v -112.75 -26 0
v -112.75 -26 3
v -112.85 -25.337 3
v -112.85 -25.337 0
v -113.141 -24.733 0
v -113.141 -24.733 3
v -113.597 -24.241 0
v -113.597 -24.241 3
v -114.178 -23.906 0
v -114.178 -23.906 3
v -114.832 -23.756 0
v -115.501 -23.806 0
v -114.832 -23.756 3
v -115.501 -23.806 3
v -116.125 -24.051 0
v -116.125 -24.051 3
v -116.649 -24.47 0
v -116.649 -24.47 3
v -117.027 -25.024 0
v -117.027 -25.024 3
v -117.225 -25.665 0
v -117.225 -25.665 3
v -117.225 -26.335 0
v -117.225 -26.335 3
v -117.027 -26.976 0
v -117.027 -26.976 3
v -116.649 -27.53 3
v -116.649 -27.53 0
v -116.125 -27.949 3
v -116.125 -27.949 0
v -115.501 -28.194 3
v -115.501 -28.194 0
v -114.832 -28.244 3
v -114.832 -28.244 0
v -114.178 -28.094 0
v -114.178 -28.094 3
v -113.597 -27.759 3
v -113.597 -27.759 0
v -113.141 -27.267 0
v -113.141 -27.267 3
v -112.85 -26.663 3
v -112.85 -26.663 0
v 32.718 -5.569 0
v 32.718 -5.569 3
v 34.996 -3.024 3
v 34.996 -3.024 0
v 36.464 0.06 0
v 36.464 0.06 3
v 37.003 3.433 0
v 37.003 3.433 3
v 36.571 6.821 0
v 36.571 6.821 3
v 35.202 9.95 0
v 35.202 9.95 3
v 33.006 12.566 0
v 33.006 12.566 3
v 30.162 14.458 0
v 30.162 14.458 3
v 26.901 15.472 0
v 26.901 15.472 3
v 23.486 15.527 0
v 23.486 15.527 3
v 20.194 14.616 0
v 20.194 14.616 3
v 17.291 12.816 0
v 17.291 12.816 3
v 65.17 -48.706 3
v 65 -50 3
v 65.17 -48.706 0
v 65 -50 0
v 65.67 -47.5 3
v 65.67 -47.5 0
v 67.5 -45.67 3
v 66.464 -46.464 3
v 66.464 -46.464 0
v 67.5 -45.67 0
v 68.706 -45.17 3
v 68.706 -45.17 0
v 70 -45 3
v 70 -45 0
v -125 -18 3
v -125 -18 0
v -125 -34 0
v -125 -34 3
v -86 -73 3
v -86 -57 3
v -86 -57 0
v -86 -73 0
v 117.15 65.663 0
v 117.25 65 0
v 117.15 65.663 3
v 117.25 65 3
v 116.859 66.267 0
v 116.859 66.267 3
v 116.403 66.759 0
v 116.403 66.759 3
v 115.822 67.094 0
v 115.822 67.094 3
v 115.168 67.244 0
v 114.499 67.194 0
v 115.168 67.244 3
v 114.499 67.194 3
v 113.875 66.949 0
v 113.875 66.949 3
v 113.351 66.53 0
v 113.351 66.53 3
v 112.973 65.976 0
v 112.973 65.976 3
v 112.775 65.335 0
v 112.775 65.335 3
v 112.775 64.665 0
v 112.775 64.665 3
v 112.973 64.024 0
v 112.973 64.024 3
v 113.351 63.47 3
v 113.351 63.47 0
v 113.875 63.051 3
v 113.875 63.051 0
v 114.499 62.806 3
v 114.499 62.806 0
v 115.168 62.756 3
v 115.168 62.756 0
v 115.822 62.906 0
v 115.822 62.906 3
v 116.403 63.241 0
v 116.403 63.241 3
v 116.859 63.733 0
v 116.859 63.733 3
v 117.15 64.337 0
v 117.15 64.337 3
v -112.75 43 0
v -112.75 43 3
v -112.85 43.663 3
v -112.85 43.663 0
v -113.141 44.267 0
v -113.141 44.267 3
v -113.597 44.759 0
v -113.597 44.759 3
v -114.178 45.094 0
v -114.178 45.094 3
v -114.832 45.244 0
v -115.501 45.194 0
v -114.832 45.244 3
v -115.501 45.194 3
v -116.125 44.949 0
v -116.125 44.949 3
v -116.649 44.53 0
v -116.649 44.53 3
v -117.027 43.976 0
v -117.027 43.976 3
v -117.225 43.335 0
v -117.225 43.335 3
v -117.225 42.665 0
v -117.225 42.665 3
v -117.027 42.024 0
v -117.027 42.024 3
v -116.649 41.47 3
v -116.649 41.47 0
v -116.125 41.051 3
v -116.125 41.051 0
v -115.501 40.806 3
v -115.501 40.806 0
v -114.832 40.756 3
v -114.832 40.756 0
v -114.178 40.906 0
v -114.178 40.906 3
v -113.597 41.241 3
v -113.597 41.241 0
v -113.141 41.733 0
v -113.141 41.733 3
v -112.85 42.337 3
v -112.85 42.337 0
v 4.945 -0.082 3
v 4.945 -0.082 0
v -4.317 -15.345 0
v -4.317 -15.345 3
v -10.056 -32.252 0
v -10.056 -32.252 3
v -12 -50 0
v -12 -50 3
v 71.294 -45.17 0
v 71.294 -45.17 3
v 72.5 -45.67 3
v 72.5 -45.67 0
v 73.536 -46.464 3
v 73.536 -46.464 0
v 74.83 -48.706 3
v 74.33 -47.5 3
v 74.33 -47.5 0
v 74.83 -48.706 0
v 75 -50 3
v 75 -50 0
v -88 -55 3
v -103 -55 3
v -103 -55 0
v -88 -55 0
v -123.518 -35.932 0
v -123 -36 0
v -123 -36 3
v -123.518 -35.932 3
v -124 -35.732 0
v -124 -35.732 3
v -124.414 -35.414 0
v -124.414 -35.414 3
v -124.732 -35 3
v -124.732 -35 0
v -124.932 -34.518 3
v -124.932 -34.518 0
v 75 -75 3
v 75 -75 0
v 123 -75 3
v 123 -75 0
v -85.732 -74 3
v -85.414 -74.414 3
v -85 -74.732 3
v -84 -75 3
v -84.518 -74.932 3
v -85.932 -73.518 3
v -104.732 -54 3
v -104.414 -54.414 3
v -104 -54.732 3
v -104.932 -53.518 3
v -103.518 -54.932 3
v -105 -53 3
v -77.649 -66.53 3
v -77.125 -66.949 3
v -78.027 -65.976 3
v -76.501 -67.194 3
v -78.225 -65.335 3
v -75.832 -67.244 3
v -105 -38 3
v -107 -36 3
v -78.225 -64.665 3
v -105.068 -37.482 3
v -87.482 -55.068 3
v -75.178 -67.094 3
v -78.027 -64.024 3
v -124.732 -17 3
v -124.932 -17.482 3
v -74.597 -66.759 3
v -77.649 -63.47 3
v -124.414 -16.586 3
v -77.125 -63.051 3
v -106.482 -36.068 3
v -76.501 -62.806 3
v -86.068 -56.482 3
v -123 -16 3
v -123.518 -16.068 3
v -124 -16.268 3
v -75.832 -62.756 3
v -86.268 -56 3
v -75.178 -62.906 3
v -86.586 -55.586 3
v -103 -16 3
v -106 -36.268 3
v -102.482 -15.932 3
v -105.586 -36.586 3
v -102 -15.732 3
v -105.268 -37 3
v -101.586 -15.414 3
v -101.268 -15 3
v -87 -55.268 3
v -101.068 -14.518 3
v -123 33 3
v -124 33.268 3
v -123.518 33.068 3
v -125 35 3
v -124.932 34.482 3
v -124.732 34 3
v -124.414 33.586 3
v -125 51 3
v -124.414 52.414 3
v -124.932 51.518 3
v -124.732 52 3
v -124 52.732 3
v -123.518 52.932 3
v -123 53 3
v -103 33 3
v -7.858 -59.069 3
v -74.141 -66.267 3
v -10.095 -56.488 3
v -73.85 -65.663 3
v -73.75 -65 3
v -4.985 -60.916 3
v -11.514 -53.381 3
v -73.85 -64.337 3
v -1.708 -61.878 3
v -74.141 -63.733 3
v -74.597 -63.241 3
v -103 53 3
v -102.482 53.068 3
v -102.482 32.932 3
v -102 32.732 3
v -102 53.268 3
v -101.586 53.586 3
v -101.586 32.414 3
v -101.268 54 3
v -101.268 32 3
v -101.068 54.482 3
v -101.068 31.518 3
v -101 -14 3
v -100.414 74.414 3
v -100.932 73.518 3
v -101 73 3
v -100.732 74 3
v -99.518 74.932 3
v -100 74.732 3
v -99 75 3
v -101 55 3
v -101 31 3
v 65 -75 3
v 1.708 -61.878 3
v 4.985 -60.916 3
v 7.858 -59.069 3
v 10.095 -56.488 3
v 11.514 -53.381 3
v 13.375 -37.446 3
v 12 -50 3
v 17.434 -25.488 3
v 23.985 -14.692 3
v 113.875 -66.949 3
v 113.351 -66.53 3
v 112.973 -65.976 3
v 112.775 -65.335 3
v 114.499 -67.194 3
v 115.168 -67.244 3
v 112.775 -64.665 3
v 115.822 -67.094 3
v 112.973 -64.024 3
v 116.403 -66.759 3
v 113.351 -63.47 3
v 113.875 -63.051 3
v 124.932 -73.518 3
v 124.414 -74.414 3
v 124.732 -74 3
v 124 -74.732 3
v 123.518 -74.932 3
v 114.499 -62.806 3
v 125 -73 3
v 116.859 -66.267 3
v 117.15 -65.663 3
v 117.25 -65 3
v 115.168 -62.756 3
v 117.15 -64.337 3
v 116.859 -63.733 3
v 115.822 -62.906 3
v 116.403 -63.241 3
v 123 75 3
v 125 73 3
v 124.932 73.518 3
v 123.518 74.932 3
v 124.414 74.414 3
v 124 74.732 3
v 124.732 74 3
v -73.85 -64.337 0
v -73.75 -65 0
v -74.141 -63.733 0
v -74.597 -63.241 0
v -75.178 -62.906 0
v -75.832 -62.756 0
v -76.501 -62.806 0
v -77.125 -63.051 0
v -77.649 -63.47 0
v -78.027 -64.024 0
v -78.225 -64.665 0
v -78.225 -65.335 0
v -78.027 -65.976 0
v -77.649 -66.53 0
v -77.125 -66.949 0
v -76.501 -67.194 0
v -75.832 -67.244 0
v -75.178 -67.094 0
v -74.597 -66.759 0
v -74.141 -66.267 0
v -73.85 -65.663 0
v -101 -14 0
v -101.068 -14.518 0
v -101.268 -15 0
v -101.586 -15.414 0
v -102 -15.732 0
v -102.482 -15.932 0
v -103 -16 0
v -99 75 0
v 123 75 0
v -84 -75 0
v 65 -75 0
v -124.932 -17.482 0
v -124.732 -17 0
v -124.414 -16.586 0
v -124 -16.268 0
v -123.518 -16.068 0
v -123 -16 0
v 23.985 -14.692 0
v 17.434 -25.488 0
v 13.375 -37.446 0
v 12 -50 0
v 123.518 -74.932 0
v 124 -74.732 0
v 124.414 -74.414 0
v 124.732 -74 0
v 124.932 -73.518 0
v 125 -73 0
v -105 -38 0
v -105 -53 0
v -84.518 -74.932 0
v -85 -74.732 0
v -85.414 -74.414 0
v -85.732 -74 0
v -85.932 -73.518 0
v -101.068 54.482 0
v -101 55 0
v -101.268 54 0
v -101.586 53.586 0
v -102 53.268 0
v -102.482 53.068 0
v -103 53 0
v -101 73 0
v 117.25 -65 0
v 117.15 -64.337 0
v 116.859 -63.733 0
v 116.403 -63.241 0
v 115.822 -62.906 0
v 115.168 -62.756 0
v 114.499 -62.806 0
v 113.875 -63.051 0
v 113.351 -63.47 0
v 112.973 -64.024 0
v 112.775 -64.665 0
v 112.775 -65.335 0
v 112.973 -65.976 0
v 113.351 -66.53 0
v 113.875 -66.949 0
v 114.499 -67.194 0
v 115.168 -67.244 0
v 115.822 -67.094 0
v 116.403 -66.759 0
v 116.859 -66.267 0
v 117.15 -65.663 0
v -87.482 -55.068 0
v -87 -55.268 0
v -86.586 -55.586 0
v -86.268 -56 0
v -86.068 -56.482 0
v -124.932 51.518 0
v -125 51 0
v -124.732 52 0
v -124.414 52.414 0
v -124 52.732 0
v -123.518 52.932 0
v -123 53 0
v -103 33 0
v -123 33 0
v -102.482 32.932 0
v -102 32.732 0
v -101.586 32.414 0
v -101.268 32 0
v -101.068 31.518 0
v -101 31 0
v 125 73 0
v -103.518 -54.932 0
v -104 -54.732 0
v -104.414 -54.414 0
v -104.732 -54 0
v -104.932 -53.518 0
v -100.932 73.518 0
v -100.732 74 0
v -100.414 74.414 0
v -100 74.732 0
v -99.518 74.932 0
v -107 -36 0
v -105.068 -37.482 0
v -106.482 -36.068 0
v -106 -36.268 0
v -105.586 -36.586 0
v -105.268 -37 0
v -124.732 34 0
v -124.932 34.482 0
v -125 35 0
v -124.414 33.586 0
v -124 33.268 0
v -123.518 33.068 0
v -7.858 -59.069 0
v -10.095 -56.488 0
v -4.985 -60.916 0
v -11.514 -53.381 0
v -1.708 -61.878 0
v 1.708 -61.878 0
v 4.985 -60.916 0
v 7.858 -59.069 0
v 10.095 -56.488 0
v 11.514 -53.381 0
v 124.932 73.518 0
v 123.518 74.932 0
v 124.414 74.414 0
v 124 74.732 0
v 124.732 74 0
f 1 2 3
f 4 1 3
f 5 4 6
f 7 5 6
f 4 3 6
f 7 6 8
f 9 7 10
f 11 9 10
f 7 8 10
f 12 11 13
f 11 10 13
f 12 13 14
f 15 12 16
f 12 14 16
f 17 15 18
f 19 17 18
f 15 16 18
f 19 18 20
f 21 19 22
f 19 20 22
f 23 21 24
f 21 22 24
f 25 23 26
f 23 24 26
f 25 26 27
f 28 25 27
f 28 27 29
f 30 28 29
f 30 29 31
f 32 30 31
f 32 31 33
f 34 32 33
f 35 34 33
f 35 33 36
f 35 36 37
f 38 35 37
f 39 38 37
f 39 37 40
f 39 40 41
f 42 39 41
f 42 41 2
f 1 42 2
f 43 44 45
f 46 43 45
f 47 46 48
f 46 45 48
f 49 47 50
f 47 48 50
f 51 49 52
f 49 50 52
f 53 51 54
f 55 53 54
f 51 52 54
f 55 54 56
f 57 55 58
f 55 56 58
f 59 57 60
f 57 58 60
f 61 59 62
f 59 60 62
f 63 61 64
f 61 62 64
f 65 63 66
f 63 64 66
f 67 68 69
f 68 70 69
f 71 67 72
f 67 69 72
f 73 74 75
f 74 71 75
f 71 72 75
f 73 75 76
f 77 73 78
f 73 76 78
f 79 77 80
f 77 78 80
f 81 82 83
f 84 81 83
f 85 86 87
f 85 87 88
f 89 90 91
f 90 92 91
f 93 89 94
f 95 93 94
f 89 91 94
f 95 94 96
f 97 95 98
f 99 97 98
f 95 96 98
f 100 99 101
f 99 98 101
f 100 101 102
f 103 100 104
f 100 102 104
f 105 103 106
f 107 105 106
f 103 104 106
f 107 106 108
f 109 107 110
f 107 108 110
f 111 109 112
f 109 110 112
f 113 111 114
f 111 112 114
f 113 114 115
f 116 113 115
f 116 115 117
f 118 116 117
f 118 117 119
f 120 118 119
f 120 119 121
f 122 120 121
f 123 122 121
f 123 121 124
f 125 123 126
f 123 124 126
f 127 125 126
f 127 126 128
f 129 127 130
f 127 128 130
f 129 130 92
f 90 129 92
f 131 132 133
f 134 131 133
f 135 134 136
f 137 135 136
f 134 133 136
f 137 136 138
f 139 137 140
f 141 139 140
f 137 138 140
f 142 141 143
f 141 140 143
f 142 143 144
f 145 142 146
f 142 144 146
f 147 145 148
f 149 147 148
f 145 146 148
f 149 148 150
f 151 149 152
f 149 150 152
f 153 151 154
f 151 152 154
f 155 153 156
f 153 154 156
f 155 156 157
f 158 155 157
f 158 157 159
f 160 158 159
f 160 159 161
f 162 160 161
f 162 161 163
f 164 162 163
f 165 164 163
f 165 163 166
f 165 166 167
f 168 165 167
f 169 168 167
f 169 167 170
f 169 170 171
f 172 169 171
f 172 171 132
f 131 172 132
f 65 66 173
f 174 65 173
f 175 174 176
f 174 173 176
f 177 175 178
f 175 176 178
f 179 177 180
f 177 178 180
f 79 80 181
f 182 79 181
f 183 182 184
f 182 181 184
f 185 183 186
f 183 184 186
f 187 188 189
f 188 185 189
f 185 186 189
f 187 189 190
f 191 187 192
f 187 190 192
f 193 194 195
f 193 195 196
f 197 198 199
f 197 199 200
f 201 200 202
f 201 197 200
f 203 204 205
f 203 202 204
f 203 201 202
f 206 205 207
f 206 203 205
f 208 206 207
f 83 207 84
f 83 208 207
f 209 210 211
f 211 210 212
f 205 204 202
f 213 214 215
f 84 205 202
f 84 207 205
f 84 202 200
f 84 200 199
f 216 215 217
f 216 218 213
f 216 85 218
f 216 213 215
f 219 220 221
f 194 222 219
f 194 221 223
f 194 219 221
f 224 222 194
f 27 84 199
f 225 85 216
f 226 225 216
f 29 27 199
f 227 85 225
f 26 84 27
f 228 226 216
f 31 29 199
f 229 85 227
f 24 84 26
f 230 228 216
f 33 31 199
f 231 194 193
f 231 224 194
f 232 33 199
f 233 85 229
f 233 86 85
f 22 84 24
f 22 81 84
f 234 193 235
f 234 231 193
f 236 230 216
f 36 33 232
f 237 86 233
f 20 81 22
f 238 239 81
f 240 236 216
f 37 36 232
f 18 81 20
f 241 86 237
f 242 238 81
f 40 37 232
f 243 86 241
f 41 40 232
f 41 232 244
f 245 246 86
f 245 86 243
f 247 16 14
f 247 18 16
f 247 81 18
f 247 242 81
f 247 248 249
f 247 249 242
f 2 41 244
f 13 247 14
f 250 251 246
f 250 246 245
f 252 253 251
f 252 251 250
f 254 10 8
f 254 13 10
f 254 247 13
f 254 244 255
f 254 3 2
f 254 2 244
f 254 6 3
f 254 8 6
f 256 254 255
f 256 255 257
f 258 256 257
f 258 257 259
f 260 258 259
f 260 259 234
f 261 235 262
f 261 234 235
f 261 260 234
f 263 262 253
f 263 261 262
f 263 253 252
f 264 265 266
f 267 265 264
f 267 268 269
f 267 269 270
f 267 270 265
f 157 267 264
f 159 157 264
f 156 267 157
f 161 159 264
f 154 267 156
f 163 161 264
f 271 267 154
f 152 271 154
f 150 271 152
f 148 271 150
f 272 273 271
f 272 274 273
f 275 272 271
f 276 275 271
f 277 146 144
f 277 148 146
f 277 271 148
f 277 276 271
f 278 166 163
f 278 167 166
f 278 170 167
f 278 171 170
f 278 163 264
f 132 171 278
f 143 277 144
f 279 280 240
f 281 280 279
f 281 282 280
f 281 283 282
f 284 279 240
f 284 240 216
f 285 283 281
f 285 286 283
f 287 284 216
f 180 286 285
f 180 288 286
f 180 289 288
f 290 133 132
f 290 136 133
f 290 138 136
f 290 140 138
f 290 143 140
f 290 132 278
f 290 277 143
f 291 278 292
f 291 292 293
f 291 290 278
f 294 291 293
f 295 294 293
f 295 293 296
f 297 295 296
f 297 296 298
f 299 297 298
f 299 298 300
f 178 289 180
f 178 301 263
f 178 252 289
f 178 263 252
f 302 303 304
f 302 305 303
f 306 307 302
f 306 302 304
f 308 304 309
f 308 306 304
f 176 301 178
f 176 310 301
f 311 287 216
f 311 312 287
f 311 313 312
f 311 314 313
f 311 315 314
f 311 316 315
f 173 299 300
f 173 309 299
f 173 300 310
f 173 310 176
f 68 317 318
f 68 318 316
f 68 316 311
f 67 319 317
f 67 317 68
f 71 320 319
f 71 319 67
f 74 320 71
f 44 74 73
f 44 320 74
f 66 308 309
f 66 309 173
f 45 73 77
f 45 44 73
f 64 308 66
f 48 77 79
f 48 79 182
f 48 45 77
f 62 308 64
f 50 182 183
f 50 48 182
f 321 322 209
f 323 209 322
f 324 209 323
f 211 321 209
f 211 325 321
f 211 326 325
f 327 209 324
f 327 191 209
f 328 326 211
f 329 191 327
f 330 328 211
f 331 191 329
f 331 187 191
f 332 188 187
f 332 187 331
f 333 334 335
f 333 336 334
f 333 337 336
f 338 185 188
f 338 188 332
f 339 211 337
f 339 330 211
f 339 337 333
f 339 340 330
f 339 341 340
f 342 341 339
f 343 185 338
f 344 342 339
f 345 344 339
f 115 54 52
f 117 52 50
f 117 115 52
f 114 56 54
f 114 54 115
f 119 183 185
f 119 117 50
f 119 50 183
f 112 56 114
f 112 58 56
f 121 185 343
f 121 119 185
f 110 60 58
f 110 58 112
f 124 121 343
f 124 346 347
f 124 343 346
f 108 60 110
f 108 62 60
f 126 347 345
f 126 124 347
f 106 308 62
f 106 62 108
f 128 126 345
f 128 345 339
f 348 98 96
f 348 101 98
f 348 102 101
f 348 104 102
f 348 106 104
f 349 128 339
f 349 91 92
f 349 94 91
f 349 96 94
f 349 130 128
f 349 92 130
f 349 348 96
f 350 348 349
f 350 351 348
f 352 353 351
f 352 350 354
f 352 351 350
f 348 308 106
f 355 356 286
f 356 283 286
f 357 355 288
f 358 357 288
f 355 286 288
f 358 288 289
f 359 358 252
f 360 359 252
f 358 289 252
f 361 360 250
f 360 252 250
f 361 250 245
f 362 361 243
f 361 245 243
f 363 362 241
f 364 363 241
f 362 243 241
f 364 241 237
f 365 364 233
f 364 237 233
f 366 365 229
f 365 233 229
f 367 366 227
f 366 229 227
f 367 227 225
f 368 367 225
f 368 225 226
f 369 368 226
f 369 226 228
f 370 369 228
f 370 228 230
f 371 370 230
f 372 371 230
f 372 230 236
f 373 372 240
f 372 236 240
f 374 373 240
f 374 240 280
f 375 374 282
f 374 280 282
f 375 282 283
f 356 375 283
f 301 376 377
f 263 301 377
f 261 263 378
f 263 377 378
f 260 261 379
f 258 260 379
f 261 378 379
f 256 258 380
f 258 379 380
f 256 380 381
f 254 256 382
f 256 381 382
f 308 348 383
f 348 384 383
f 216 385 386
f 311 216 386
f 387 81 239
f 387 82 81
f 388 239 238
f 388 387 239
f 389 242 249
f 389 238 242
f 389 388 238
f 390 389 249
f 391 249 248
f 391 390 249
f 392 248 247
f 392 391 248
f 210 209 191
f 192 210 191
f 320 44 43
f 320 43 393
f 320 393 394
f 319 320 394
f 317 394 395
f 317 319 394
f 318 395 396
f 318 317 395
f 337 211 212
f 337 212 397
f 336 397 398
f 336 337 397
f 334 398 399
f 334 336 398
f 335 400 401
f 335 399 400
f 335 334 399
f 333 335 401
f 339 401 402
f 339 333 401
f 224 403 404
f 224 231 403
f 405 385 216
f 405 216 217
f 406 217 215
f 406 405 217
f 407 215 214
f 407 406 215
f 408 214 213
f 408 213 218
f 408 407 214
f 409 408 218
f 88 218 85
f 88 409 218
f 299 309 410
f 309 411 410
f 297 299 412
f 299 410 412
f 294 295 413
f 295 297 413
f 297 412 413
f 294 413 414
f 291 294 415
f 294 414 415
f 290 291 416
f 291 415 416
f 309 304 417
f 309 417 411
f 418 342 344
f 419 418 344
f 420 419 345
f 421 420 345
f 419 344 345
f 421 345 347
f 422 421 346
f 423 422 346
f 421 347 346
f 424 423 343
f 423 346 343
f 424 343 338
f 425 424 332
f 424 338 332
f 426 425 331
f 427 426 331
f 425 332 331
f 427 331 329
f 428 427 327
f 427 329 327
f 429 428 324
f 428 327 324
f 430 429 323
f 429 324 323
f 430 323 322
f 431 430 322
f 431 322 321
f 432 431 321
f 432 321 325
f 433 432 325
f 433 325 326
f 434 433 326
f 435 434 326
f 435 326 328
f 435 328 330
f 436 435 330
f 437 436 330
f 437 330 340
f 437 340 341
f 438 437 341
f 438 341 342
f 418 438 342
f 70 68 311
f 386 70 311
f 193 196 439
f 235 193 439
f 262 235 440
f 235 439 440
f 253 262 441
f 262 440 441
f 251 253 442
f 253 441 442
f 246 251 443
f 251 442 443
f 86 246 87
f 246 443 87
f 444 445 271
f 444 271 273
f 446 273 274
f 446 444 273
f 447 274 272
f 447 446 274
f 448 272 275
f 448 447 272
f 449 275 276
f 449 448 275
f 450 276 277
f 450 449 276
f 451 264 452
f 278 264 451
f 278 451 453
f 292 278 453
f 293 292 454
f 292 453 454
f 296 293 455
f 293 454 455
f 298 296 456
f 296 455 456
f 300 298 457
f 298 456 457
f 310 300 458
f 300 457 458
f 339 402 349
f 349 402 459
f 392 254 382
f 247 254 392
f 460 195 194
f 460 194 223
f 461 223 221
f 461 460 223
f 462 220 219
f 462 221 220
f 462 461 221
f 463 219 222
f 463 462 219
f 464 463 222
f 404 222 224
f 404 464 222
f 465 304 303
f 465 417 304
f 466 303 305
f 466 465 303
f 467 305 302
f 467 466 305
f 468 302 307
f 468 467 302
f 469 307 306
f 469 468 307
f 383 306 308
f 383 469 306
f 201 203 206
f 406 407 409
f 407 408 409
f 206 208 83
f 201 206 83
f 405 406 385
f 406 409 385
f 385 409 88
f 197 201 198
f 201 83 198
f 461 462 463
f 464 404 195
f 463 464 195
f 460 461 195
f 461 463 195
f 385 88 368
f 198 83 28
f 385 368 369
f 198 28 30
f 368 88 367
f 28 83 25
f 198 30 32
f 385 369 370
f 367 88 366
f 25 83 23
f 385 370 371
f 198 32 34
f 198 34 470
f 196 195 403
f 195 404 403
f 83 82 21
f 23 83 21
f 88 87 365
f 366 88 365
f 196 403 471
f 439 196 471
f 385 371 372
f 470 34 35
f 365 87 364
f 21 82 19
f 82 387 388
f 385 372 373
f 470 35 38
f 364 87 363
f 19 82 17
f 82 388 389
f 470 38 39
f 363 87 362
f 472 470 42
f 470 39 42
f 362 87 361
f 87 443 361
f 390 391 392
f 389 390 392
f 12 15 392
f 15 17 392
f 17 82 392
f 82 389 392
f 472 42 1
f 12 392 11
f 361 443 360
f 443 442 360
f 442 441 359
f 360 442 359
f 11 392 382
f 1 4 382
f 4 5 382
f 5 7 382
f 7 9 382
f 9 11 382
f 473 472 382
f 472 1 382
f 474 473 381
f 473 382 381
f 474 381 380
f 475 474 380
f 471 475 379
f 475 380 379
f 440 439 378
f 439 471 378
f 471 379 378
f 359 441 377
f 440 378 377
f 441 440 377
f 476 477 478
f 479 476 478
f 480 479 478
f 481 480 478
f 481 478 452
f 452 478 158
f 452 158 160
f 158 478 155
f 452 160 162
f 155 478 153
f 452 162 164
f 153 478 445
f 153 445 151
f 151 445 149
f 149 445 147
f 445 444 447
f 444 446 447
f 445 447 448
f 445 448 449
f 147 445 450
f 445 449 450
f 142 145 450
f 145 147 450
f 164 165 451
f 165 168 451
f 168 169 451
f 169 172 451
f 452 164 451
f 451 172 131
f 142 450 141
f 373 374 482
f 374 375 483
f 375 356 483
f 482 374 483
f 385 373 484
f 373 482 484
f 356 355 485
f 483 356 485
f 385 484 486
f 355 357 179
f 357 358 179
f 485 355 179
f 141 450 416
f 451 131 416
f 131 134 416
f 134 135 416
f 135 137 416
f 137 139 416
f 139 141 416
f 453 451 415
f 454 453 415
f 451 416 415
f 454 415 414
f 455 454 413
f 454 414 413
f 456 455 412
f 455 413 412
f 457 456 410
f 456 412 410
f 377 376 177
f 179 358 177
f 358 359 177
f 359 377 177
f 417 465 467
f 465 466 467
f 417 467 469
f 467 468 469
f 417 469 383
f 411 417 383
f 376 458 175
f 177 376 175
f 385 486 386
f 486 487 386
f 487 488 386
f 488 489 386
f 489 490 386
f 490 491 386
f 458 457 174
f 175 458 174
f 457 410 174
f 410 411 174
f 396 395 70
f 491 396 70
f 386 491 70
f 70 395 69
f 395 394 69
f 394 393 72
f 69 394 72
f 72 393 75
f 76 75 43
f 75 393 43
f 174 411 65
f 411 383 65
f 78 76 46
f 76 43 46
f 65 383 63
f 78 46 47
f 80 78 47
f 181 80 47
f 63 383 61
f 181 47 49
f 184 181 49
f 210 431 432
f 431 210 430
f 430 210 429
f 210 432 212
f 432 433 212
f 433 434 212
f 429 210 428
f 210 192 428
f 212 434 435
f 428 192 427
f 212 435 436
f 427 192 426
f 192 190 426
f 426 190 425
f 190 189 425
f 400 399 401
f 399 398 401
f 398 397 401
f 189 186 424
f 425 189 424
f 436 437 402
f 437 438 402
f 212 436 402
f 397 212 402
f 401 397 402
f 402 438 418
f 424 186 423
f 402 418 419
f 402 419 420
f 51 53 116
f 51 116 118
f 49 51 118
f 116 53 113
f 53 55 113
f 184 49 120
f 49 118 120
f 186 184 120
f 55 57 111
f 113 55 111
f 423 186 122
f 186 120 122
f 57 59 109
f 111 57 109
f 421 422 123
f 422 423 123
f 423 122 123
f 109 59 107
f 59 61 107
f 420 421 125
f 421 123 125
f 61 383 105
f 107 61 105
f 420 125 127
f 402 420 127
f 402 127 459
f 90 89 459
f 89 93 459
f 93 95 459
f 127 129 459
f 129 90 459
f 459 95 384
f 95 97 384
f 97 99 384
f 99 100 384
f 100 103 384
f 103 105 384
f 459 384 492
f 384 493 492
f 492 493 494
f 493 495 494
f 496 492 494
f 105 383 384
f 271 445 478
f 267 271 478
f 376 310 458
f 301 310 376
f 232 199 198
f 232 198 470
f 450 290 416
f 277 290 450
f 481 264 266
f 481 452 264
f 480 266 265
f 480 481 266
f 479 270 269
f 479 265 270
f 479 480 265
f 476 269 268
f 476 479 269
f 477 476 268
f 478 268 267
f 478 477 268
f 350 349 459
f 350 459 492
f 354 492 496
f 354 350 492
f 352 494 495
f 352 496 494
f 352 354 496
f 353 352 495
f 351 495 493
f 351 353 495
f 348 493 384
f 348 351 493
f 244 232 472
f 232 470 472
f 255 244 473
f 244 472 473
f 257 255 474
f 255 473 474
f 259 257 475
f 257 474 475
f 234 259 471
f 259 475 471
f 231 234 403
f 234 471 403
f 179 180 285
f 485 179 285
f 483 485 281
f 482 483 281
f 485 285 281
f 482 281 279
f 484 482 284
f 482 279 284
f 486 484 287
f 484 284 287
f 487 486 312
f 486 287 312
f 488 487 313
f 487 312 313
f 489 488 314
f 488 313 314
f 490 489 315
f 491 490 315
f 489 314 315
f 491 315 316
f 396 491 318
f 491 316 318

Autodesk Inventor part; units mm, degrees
ref_plane "YZ Plane" through (0, 0, 0) normal (1, 0, 0) x (0, 1, 0)
ref_plane "XZ Plane" through (0, 0, 0) normal (0, 1, 0) x (-1, 0, 0)
ref_plane "XY Plane" through (0, 0, 0) normal (0, 0, 1) x (1, 0, 0)
sketch "Sketch1" plane through (0, 0, 0) normal (0, 0, 1) x (1, 0, 0)
  line L0 (-125, -75) -> (125, -75)
  line L1 (125, -75) -> (125, 75)
  line L2 (125, 75) -> (-125, 75)
  line L3 (-125, 75) -> (-125, -75)
  line L4 (-125, -75) -> (125, 75) construction
  line L5 (125, -75) -> (-125, 75) construction
  point P0 (0, 0)
  dimension "d0" = 150
  dimension "d1" = 250
extrude "Extrusion1" add sketch "Sketch1" along normal blind 3
sketch "Sketch2" plane through (0, 0, 3) normal (0, 0, 1) x (1, 0, 0)
  line L0 (125, -75) -> (125, 75) construction
  line L1 (125, 75) -> (-125, 75) construction
  line L2 (-125, 75) -> (-125, -75) construction
  line L3 (-125, -75) -> (125, -75) construction
  line L4 (-125, -36) -> (-105, -36)
  line L5 (-105, -36) -> (-105, -55)
  line L6 (-105, -55) -> (-86, -55)
  line L7 (-86, -55) -> (-86, -75)
  line L8 (-125, -75) -> (125, -75) construction
  line L9 (-125, 75) -> (-125, -75) construction
  line L10 (-125, -36) -> (-125, -75)
  line L11 (-86, -75) -> (-125, -75)
  line L12 (-125, 33) -> (-101, 33)
  line L13 (-101, 33) -> (-101, -16)
  line L14 (-101, -16) -> (-125, -16)
  line L15 (-125, -16) -> (-125, 33)
  line L16 (65, -75) -> (75, -75)
  line L17 (75, -75) -> (75, -45)
  line L18 (75, -45) -> (65, -45)
  line L19 (65, -45) -> (65, -75)
  line L20 (125, 75) -> (-125, 75) projected
  line L21 (-125, 75) -> (-101, 75)
  line L22 (-101, 75) -> (-101, 53)
  line L23 (-101, 53) -> (-125, 53)
  line L24 (-125, 53) -> (-125, 75)
  point P0 (0, 0)
  dimension "d4" = 39
  dimension "d5" = 39
  dimension "d6" = 20
  dimension "d7" = 20
  dimension "d9" = 24
  dimension "d11" = 20
  dimension "d13" = 10
  dimension "d14" = 30
  dimension "d36" = 50
  dimension "d37" = 22
  dimension "d39" = 42
extrude "Extrusion2" cut sketch "Sketch2" against normal blind 3
sketch "Sketch3" plane through (0, 0, 3) normal (0, 0, 1) x (1, 0, 0)
  circle A0 centre (-115, 43) radius 2.25
  circle A1 centre (-115, -26) radius 2.25
  circle A2 centre (115, 65) radius 2.25
  circle A3 centre (115, -65) radius 2.25
  circle A4 centre (-76, -65) radius 2.25
  line L0 (125, 75) -> (-125, 75) projected
  line L1 (-125, 75) -> (-125, 33) projected
  line L2 (-125, -16) -> (-125, -36) projected
  line L3 (-125, -36) -> (-105, -36) projected
  line L4 (-86, -75) -> (65, -75) projected
  line L5 (-86, -55) -> (-86, -75) projected
  line L6 (75, -75) -> (125, -75) projected
  line L7 (125, -75) -> (125, 75) projected
  line L8 (-125, 53) -> (-101, 53) projected
  point P0 (0, 0)
  dimension "d17" = 4.5
  dimension "d18" = 4.5
  dimension "d19" = 4.5
  dimension "d20" = 4.5
  dimension "d21" = 4.5
  dimension "d23" = 10
  dimension "d24" = 10
  dimension "d25" = 10
  dimension "d26" = 10
  dimension "d27" = 10
  dimension "d28" = 10
  dimension "d29" = 10
  dimension "d30" = 10
  dimension "d31" = 10
  dimension "d38" = 10
extrude "Extrusion3" cut sketch "Sketch3" against normal through all
fillet "Fillet1" radius 2 14 edges at (125, 75, 1.5) (125, -75, 1.5) (-86, -75, 1.5) (-86, -55, 1.5) (-105, -55, 1.5) (-105, -36, 1.5) (-125, -36, 1.5) (-125, -16, 1.5) (-101, -16, 1.5) (-101, 33, 1.5) (-125, 33, 1.5) (-125, 53, 1.5) (-101, 53, 1.5) (-101, 75, 1.5)
fillet "Fillet1" radius 5 2 edges at (65, -45, 1.5) (75, -45, 1.5)
sketch "Sketch4" plane through (0, 0, 3) normal (0, 0, 1) x (1, 0, 0)
  circle A0 centre (70, -50) radius 70 construction
  arc A1 (75, -50) -> (65, -50) centre (70, -50) ccw projected
  arc A2 (25.0049, 3.6231) -> (0, -50) centre (70, -50) ccw construction
  arc A3 (17.2914, 12.8156) -> (-12, -50) centre (70, -50) ccw
  arc A4 (32.7183, -5.5694) -> (12, -50) centre (70, -50) ccw
  arc A5 (32.7183, -5.5694) -> (17.2914, 12.8156) centre (25.0049, 3.6231) ccw
  arc A6 (-12, -50) -> (12, -50) centre (0, -50) ccw
  line L0 (70, -50) -> (-9.4291, 44.6599) construction
  line L1 (-84, -75) -> (65, -75) projected
  arc A7 (75, -50) -> (65, -50) centre (70, -50) ccw projected
  line L2 (70, -50) -> (-137.9858, -50) construction
  point P0 (0, 0)
  dimension "d40" = 140
  dimension "d43" = 50
  dimension "d44" = 12
extrude "Extrusion4" cut sketch "Sketch4" against normal through all
sketch "Sketch5" plane through (0, 0, 3) normal (0, 0, 1) x (1, 0, 0)
  arc A0 (-12, -50) -> (12, -50) centre (0, -50) ccw projected
  arc A1 (17.2914, 12.8156) -> (-12, -50) centre (70, -50) ccw projected
  arc A2 (32.7183, -5.5694) -> (17.2914, 12.8156) centre (25.0049, 3.6231) ccw projected
  arc A3 (32.7183, -5.5694) -> (12, -50) centre (70, -50) ccw projected
  arc A4 (-99, 75) -> (-101, 73) centre (-99, 73) ccw projected
  line L0 (-101, 73) -> (-101, 55) projected
  arc A5 (-103, 53) -> (-101, 55) centre (-103, 55) ccw projected
  line L1 (-103, 53) -> (-123, 53) projected
  arc A6 (-123, 53) -> (-125, 51) centre (-123, 51) ccw projected
  line L2 (-125, 51) -> (-125, 35) projected
  arc A7 (-125, 35) -> (-123, 33) centre (-123, 35) ccw projected
  line L3 (-123, 33) -> (-103, 33) projected
  arc A8 (-101, 31) -> (-103, 33) centre (-103, 31) ccw projected
  line L4 (-101, 31) -> (-101, -14) projected
  arc A9 (-103, -16) -> (-101, -14) centre (-103, -14) ccw projected
  line L5 (-103, -16) -> (-123, -16) projected
  arc A10 (-123, -16) -> (-125, -18) centre (-123, -18) ccw projected
  line L6 (-125, -18) -> (-125, -34) projected
  arc A11 (-125, -34) -> (-123, -36) centre (-123, -34) ccw projected
  line L7 (-123, -36) -> (-107, -36) projected
  arc A12 (-105, -38) -> (-107, -36) centre (-107, -38) ccw projected
  line L8 (-105, -38) -> (-105, -53) projected
  arc A13 (-105, -53) -> (-103, -55) centre (-103, -53) ccw projected
  line L9 (-103, -55) -> (-88, -55) projected
  arc A14 (-86, -57) -> (-88, -55) centre (-88, -57) ccw projected
  line L10 (-86, -57) -> (-86, -73) projected
  arc A15 (-86, -73) -> (-84, -75) centre (-84, -73) ccw projected
  line L11 (-84, -75) -> (65, -75) projected
  line L12 (65, -75) -> (65, -50) projected
  arc A16 (75, -50) -> (65, -50) centre (70, -50) ccw projected
  line L13 (75, -50) -> (75, -75) projected
  line L14 (75, -75) -> (123, -75) projected
  arc A17 (123, -75) -> (125, -73) centre (123, -73) ccw projected
  line L15 (125, -73) -> (125, 73) projected
  arc A18 (125, 73) -> (123, 75) centre (123, 73) ccw projected
  line L16 (123, 75) -> (-99, 75) projected
  circle A19 centre (-115, 43) radius 2.25 projected
  circle A20 centre (115, 65) radius 2.25 projected
  circle A21 centre (-115, -26) radius 2.25 projected
  circle A22 centre (115, -65) radius 2.25 projected
  circle A23 centre (-76, -65) radius 2.25 projected
  point P0 (0, 0)
equation "\"d5\" = d4"
equation "\"d18\" = d17"
equation "\"d19\" = d17"
equation "\"d20\" = d17"
equation "\"d21\" = d17"
equation "\"d24\" = d23"
equation "\"d25\" = d23"
equation "\"d26\" = d25"
equation "\"d27\" = d25"
equation "\"d28\" = d26"
equation "\"d29\" = d26"
equation "\"d30\" = d23"
equation "\"d31\" = d23"
equation "\"d38\" = d23"
properties part number "SideAcrylicSheet_WithOpening"
